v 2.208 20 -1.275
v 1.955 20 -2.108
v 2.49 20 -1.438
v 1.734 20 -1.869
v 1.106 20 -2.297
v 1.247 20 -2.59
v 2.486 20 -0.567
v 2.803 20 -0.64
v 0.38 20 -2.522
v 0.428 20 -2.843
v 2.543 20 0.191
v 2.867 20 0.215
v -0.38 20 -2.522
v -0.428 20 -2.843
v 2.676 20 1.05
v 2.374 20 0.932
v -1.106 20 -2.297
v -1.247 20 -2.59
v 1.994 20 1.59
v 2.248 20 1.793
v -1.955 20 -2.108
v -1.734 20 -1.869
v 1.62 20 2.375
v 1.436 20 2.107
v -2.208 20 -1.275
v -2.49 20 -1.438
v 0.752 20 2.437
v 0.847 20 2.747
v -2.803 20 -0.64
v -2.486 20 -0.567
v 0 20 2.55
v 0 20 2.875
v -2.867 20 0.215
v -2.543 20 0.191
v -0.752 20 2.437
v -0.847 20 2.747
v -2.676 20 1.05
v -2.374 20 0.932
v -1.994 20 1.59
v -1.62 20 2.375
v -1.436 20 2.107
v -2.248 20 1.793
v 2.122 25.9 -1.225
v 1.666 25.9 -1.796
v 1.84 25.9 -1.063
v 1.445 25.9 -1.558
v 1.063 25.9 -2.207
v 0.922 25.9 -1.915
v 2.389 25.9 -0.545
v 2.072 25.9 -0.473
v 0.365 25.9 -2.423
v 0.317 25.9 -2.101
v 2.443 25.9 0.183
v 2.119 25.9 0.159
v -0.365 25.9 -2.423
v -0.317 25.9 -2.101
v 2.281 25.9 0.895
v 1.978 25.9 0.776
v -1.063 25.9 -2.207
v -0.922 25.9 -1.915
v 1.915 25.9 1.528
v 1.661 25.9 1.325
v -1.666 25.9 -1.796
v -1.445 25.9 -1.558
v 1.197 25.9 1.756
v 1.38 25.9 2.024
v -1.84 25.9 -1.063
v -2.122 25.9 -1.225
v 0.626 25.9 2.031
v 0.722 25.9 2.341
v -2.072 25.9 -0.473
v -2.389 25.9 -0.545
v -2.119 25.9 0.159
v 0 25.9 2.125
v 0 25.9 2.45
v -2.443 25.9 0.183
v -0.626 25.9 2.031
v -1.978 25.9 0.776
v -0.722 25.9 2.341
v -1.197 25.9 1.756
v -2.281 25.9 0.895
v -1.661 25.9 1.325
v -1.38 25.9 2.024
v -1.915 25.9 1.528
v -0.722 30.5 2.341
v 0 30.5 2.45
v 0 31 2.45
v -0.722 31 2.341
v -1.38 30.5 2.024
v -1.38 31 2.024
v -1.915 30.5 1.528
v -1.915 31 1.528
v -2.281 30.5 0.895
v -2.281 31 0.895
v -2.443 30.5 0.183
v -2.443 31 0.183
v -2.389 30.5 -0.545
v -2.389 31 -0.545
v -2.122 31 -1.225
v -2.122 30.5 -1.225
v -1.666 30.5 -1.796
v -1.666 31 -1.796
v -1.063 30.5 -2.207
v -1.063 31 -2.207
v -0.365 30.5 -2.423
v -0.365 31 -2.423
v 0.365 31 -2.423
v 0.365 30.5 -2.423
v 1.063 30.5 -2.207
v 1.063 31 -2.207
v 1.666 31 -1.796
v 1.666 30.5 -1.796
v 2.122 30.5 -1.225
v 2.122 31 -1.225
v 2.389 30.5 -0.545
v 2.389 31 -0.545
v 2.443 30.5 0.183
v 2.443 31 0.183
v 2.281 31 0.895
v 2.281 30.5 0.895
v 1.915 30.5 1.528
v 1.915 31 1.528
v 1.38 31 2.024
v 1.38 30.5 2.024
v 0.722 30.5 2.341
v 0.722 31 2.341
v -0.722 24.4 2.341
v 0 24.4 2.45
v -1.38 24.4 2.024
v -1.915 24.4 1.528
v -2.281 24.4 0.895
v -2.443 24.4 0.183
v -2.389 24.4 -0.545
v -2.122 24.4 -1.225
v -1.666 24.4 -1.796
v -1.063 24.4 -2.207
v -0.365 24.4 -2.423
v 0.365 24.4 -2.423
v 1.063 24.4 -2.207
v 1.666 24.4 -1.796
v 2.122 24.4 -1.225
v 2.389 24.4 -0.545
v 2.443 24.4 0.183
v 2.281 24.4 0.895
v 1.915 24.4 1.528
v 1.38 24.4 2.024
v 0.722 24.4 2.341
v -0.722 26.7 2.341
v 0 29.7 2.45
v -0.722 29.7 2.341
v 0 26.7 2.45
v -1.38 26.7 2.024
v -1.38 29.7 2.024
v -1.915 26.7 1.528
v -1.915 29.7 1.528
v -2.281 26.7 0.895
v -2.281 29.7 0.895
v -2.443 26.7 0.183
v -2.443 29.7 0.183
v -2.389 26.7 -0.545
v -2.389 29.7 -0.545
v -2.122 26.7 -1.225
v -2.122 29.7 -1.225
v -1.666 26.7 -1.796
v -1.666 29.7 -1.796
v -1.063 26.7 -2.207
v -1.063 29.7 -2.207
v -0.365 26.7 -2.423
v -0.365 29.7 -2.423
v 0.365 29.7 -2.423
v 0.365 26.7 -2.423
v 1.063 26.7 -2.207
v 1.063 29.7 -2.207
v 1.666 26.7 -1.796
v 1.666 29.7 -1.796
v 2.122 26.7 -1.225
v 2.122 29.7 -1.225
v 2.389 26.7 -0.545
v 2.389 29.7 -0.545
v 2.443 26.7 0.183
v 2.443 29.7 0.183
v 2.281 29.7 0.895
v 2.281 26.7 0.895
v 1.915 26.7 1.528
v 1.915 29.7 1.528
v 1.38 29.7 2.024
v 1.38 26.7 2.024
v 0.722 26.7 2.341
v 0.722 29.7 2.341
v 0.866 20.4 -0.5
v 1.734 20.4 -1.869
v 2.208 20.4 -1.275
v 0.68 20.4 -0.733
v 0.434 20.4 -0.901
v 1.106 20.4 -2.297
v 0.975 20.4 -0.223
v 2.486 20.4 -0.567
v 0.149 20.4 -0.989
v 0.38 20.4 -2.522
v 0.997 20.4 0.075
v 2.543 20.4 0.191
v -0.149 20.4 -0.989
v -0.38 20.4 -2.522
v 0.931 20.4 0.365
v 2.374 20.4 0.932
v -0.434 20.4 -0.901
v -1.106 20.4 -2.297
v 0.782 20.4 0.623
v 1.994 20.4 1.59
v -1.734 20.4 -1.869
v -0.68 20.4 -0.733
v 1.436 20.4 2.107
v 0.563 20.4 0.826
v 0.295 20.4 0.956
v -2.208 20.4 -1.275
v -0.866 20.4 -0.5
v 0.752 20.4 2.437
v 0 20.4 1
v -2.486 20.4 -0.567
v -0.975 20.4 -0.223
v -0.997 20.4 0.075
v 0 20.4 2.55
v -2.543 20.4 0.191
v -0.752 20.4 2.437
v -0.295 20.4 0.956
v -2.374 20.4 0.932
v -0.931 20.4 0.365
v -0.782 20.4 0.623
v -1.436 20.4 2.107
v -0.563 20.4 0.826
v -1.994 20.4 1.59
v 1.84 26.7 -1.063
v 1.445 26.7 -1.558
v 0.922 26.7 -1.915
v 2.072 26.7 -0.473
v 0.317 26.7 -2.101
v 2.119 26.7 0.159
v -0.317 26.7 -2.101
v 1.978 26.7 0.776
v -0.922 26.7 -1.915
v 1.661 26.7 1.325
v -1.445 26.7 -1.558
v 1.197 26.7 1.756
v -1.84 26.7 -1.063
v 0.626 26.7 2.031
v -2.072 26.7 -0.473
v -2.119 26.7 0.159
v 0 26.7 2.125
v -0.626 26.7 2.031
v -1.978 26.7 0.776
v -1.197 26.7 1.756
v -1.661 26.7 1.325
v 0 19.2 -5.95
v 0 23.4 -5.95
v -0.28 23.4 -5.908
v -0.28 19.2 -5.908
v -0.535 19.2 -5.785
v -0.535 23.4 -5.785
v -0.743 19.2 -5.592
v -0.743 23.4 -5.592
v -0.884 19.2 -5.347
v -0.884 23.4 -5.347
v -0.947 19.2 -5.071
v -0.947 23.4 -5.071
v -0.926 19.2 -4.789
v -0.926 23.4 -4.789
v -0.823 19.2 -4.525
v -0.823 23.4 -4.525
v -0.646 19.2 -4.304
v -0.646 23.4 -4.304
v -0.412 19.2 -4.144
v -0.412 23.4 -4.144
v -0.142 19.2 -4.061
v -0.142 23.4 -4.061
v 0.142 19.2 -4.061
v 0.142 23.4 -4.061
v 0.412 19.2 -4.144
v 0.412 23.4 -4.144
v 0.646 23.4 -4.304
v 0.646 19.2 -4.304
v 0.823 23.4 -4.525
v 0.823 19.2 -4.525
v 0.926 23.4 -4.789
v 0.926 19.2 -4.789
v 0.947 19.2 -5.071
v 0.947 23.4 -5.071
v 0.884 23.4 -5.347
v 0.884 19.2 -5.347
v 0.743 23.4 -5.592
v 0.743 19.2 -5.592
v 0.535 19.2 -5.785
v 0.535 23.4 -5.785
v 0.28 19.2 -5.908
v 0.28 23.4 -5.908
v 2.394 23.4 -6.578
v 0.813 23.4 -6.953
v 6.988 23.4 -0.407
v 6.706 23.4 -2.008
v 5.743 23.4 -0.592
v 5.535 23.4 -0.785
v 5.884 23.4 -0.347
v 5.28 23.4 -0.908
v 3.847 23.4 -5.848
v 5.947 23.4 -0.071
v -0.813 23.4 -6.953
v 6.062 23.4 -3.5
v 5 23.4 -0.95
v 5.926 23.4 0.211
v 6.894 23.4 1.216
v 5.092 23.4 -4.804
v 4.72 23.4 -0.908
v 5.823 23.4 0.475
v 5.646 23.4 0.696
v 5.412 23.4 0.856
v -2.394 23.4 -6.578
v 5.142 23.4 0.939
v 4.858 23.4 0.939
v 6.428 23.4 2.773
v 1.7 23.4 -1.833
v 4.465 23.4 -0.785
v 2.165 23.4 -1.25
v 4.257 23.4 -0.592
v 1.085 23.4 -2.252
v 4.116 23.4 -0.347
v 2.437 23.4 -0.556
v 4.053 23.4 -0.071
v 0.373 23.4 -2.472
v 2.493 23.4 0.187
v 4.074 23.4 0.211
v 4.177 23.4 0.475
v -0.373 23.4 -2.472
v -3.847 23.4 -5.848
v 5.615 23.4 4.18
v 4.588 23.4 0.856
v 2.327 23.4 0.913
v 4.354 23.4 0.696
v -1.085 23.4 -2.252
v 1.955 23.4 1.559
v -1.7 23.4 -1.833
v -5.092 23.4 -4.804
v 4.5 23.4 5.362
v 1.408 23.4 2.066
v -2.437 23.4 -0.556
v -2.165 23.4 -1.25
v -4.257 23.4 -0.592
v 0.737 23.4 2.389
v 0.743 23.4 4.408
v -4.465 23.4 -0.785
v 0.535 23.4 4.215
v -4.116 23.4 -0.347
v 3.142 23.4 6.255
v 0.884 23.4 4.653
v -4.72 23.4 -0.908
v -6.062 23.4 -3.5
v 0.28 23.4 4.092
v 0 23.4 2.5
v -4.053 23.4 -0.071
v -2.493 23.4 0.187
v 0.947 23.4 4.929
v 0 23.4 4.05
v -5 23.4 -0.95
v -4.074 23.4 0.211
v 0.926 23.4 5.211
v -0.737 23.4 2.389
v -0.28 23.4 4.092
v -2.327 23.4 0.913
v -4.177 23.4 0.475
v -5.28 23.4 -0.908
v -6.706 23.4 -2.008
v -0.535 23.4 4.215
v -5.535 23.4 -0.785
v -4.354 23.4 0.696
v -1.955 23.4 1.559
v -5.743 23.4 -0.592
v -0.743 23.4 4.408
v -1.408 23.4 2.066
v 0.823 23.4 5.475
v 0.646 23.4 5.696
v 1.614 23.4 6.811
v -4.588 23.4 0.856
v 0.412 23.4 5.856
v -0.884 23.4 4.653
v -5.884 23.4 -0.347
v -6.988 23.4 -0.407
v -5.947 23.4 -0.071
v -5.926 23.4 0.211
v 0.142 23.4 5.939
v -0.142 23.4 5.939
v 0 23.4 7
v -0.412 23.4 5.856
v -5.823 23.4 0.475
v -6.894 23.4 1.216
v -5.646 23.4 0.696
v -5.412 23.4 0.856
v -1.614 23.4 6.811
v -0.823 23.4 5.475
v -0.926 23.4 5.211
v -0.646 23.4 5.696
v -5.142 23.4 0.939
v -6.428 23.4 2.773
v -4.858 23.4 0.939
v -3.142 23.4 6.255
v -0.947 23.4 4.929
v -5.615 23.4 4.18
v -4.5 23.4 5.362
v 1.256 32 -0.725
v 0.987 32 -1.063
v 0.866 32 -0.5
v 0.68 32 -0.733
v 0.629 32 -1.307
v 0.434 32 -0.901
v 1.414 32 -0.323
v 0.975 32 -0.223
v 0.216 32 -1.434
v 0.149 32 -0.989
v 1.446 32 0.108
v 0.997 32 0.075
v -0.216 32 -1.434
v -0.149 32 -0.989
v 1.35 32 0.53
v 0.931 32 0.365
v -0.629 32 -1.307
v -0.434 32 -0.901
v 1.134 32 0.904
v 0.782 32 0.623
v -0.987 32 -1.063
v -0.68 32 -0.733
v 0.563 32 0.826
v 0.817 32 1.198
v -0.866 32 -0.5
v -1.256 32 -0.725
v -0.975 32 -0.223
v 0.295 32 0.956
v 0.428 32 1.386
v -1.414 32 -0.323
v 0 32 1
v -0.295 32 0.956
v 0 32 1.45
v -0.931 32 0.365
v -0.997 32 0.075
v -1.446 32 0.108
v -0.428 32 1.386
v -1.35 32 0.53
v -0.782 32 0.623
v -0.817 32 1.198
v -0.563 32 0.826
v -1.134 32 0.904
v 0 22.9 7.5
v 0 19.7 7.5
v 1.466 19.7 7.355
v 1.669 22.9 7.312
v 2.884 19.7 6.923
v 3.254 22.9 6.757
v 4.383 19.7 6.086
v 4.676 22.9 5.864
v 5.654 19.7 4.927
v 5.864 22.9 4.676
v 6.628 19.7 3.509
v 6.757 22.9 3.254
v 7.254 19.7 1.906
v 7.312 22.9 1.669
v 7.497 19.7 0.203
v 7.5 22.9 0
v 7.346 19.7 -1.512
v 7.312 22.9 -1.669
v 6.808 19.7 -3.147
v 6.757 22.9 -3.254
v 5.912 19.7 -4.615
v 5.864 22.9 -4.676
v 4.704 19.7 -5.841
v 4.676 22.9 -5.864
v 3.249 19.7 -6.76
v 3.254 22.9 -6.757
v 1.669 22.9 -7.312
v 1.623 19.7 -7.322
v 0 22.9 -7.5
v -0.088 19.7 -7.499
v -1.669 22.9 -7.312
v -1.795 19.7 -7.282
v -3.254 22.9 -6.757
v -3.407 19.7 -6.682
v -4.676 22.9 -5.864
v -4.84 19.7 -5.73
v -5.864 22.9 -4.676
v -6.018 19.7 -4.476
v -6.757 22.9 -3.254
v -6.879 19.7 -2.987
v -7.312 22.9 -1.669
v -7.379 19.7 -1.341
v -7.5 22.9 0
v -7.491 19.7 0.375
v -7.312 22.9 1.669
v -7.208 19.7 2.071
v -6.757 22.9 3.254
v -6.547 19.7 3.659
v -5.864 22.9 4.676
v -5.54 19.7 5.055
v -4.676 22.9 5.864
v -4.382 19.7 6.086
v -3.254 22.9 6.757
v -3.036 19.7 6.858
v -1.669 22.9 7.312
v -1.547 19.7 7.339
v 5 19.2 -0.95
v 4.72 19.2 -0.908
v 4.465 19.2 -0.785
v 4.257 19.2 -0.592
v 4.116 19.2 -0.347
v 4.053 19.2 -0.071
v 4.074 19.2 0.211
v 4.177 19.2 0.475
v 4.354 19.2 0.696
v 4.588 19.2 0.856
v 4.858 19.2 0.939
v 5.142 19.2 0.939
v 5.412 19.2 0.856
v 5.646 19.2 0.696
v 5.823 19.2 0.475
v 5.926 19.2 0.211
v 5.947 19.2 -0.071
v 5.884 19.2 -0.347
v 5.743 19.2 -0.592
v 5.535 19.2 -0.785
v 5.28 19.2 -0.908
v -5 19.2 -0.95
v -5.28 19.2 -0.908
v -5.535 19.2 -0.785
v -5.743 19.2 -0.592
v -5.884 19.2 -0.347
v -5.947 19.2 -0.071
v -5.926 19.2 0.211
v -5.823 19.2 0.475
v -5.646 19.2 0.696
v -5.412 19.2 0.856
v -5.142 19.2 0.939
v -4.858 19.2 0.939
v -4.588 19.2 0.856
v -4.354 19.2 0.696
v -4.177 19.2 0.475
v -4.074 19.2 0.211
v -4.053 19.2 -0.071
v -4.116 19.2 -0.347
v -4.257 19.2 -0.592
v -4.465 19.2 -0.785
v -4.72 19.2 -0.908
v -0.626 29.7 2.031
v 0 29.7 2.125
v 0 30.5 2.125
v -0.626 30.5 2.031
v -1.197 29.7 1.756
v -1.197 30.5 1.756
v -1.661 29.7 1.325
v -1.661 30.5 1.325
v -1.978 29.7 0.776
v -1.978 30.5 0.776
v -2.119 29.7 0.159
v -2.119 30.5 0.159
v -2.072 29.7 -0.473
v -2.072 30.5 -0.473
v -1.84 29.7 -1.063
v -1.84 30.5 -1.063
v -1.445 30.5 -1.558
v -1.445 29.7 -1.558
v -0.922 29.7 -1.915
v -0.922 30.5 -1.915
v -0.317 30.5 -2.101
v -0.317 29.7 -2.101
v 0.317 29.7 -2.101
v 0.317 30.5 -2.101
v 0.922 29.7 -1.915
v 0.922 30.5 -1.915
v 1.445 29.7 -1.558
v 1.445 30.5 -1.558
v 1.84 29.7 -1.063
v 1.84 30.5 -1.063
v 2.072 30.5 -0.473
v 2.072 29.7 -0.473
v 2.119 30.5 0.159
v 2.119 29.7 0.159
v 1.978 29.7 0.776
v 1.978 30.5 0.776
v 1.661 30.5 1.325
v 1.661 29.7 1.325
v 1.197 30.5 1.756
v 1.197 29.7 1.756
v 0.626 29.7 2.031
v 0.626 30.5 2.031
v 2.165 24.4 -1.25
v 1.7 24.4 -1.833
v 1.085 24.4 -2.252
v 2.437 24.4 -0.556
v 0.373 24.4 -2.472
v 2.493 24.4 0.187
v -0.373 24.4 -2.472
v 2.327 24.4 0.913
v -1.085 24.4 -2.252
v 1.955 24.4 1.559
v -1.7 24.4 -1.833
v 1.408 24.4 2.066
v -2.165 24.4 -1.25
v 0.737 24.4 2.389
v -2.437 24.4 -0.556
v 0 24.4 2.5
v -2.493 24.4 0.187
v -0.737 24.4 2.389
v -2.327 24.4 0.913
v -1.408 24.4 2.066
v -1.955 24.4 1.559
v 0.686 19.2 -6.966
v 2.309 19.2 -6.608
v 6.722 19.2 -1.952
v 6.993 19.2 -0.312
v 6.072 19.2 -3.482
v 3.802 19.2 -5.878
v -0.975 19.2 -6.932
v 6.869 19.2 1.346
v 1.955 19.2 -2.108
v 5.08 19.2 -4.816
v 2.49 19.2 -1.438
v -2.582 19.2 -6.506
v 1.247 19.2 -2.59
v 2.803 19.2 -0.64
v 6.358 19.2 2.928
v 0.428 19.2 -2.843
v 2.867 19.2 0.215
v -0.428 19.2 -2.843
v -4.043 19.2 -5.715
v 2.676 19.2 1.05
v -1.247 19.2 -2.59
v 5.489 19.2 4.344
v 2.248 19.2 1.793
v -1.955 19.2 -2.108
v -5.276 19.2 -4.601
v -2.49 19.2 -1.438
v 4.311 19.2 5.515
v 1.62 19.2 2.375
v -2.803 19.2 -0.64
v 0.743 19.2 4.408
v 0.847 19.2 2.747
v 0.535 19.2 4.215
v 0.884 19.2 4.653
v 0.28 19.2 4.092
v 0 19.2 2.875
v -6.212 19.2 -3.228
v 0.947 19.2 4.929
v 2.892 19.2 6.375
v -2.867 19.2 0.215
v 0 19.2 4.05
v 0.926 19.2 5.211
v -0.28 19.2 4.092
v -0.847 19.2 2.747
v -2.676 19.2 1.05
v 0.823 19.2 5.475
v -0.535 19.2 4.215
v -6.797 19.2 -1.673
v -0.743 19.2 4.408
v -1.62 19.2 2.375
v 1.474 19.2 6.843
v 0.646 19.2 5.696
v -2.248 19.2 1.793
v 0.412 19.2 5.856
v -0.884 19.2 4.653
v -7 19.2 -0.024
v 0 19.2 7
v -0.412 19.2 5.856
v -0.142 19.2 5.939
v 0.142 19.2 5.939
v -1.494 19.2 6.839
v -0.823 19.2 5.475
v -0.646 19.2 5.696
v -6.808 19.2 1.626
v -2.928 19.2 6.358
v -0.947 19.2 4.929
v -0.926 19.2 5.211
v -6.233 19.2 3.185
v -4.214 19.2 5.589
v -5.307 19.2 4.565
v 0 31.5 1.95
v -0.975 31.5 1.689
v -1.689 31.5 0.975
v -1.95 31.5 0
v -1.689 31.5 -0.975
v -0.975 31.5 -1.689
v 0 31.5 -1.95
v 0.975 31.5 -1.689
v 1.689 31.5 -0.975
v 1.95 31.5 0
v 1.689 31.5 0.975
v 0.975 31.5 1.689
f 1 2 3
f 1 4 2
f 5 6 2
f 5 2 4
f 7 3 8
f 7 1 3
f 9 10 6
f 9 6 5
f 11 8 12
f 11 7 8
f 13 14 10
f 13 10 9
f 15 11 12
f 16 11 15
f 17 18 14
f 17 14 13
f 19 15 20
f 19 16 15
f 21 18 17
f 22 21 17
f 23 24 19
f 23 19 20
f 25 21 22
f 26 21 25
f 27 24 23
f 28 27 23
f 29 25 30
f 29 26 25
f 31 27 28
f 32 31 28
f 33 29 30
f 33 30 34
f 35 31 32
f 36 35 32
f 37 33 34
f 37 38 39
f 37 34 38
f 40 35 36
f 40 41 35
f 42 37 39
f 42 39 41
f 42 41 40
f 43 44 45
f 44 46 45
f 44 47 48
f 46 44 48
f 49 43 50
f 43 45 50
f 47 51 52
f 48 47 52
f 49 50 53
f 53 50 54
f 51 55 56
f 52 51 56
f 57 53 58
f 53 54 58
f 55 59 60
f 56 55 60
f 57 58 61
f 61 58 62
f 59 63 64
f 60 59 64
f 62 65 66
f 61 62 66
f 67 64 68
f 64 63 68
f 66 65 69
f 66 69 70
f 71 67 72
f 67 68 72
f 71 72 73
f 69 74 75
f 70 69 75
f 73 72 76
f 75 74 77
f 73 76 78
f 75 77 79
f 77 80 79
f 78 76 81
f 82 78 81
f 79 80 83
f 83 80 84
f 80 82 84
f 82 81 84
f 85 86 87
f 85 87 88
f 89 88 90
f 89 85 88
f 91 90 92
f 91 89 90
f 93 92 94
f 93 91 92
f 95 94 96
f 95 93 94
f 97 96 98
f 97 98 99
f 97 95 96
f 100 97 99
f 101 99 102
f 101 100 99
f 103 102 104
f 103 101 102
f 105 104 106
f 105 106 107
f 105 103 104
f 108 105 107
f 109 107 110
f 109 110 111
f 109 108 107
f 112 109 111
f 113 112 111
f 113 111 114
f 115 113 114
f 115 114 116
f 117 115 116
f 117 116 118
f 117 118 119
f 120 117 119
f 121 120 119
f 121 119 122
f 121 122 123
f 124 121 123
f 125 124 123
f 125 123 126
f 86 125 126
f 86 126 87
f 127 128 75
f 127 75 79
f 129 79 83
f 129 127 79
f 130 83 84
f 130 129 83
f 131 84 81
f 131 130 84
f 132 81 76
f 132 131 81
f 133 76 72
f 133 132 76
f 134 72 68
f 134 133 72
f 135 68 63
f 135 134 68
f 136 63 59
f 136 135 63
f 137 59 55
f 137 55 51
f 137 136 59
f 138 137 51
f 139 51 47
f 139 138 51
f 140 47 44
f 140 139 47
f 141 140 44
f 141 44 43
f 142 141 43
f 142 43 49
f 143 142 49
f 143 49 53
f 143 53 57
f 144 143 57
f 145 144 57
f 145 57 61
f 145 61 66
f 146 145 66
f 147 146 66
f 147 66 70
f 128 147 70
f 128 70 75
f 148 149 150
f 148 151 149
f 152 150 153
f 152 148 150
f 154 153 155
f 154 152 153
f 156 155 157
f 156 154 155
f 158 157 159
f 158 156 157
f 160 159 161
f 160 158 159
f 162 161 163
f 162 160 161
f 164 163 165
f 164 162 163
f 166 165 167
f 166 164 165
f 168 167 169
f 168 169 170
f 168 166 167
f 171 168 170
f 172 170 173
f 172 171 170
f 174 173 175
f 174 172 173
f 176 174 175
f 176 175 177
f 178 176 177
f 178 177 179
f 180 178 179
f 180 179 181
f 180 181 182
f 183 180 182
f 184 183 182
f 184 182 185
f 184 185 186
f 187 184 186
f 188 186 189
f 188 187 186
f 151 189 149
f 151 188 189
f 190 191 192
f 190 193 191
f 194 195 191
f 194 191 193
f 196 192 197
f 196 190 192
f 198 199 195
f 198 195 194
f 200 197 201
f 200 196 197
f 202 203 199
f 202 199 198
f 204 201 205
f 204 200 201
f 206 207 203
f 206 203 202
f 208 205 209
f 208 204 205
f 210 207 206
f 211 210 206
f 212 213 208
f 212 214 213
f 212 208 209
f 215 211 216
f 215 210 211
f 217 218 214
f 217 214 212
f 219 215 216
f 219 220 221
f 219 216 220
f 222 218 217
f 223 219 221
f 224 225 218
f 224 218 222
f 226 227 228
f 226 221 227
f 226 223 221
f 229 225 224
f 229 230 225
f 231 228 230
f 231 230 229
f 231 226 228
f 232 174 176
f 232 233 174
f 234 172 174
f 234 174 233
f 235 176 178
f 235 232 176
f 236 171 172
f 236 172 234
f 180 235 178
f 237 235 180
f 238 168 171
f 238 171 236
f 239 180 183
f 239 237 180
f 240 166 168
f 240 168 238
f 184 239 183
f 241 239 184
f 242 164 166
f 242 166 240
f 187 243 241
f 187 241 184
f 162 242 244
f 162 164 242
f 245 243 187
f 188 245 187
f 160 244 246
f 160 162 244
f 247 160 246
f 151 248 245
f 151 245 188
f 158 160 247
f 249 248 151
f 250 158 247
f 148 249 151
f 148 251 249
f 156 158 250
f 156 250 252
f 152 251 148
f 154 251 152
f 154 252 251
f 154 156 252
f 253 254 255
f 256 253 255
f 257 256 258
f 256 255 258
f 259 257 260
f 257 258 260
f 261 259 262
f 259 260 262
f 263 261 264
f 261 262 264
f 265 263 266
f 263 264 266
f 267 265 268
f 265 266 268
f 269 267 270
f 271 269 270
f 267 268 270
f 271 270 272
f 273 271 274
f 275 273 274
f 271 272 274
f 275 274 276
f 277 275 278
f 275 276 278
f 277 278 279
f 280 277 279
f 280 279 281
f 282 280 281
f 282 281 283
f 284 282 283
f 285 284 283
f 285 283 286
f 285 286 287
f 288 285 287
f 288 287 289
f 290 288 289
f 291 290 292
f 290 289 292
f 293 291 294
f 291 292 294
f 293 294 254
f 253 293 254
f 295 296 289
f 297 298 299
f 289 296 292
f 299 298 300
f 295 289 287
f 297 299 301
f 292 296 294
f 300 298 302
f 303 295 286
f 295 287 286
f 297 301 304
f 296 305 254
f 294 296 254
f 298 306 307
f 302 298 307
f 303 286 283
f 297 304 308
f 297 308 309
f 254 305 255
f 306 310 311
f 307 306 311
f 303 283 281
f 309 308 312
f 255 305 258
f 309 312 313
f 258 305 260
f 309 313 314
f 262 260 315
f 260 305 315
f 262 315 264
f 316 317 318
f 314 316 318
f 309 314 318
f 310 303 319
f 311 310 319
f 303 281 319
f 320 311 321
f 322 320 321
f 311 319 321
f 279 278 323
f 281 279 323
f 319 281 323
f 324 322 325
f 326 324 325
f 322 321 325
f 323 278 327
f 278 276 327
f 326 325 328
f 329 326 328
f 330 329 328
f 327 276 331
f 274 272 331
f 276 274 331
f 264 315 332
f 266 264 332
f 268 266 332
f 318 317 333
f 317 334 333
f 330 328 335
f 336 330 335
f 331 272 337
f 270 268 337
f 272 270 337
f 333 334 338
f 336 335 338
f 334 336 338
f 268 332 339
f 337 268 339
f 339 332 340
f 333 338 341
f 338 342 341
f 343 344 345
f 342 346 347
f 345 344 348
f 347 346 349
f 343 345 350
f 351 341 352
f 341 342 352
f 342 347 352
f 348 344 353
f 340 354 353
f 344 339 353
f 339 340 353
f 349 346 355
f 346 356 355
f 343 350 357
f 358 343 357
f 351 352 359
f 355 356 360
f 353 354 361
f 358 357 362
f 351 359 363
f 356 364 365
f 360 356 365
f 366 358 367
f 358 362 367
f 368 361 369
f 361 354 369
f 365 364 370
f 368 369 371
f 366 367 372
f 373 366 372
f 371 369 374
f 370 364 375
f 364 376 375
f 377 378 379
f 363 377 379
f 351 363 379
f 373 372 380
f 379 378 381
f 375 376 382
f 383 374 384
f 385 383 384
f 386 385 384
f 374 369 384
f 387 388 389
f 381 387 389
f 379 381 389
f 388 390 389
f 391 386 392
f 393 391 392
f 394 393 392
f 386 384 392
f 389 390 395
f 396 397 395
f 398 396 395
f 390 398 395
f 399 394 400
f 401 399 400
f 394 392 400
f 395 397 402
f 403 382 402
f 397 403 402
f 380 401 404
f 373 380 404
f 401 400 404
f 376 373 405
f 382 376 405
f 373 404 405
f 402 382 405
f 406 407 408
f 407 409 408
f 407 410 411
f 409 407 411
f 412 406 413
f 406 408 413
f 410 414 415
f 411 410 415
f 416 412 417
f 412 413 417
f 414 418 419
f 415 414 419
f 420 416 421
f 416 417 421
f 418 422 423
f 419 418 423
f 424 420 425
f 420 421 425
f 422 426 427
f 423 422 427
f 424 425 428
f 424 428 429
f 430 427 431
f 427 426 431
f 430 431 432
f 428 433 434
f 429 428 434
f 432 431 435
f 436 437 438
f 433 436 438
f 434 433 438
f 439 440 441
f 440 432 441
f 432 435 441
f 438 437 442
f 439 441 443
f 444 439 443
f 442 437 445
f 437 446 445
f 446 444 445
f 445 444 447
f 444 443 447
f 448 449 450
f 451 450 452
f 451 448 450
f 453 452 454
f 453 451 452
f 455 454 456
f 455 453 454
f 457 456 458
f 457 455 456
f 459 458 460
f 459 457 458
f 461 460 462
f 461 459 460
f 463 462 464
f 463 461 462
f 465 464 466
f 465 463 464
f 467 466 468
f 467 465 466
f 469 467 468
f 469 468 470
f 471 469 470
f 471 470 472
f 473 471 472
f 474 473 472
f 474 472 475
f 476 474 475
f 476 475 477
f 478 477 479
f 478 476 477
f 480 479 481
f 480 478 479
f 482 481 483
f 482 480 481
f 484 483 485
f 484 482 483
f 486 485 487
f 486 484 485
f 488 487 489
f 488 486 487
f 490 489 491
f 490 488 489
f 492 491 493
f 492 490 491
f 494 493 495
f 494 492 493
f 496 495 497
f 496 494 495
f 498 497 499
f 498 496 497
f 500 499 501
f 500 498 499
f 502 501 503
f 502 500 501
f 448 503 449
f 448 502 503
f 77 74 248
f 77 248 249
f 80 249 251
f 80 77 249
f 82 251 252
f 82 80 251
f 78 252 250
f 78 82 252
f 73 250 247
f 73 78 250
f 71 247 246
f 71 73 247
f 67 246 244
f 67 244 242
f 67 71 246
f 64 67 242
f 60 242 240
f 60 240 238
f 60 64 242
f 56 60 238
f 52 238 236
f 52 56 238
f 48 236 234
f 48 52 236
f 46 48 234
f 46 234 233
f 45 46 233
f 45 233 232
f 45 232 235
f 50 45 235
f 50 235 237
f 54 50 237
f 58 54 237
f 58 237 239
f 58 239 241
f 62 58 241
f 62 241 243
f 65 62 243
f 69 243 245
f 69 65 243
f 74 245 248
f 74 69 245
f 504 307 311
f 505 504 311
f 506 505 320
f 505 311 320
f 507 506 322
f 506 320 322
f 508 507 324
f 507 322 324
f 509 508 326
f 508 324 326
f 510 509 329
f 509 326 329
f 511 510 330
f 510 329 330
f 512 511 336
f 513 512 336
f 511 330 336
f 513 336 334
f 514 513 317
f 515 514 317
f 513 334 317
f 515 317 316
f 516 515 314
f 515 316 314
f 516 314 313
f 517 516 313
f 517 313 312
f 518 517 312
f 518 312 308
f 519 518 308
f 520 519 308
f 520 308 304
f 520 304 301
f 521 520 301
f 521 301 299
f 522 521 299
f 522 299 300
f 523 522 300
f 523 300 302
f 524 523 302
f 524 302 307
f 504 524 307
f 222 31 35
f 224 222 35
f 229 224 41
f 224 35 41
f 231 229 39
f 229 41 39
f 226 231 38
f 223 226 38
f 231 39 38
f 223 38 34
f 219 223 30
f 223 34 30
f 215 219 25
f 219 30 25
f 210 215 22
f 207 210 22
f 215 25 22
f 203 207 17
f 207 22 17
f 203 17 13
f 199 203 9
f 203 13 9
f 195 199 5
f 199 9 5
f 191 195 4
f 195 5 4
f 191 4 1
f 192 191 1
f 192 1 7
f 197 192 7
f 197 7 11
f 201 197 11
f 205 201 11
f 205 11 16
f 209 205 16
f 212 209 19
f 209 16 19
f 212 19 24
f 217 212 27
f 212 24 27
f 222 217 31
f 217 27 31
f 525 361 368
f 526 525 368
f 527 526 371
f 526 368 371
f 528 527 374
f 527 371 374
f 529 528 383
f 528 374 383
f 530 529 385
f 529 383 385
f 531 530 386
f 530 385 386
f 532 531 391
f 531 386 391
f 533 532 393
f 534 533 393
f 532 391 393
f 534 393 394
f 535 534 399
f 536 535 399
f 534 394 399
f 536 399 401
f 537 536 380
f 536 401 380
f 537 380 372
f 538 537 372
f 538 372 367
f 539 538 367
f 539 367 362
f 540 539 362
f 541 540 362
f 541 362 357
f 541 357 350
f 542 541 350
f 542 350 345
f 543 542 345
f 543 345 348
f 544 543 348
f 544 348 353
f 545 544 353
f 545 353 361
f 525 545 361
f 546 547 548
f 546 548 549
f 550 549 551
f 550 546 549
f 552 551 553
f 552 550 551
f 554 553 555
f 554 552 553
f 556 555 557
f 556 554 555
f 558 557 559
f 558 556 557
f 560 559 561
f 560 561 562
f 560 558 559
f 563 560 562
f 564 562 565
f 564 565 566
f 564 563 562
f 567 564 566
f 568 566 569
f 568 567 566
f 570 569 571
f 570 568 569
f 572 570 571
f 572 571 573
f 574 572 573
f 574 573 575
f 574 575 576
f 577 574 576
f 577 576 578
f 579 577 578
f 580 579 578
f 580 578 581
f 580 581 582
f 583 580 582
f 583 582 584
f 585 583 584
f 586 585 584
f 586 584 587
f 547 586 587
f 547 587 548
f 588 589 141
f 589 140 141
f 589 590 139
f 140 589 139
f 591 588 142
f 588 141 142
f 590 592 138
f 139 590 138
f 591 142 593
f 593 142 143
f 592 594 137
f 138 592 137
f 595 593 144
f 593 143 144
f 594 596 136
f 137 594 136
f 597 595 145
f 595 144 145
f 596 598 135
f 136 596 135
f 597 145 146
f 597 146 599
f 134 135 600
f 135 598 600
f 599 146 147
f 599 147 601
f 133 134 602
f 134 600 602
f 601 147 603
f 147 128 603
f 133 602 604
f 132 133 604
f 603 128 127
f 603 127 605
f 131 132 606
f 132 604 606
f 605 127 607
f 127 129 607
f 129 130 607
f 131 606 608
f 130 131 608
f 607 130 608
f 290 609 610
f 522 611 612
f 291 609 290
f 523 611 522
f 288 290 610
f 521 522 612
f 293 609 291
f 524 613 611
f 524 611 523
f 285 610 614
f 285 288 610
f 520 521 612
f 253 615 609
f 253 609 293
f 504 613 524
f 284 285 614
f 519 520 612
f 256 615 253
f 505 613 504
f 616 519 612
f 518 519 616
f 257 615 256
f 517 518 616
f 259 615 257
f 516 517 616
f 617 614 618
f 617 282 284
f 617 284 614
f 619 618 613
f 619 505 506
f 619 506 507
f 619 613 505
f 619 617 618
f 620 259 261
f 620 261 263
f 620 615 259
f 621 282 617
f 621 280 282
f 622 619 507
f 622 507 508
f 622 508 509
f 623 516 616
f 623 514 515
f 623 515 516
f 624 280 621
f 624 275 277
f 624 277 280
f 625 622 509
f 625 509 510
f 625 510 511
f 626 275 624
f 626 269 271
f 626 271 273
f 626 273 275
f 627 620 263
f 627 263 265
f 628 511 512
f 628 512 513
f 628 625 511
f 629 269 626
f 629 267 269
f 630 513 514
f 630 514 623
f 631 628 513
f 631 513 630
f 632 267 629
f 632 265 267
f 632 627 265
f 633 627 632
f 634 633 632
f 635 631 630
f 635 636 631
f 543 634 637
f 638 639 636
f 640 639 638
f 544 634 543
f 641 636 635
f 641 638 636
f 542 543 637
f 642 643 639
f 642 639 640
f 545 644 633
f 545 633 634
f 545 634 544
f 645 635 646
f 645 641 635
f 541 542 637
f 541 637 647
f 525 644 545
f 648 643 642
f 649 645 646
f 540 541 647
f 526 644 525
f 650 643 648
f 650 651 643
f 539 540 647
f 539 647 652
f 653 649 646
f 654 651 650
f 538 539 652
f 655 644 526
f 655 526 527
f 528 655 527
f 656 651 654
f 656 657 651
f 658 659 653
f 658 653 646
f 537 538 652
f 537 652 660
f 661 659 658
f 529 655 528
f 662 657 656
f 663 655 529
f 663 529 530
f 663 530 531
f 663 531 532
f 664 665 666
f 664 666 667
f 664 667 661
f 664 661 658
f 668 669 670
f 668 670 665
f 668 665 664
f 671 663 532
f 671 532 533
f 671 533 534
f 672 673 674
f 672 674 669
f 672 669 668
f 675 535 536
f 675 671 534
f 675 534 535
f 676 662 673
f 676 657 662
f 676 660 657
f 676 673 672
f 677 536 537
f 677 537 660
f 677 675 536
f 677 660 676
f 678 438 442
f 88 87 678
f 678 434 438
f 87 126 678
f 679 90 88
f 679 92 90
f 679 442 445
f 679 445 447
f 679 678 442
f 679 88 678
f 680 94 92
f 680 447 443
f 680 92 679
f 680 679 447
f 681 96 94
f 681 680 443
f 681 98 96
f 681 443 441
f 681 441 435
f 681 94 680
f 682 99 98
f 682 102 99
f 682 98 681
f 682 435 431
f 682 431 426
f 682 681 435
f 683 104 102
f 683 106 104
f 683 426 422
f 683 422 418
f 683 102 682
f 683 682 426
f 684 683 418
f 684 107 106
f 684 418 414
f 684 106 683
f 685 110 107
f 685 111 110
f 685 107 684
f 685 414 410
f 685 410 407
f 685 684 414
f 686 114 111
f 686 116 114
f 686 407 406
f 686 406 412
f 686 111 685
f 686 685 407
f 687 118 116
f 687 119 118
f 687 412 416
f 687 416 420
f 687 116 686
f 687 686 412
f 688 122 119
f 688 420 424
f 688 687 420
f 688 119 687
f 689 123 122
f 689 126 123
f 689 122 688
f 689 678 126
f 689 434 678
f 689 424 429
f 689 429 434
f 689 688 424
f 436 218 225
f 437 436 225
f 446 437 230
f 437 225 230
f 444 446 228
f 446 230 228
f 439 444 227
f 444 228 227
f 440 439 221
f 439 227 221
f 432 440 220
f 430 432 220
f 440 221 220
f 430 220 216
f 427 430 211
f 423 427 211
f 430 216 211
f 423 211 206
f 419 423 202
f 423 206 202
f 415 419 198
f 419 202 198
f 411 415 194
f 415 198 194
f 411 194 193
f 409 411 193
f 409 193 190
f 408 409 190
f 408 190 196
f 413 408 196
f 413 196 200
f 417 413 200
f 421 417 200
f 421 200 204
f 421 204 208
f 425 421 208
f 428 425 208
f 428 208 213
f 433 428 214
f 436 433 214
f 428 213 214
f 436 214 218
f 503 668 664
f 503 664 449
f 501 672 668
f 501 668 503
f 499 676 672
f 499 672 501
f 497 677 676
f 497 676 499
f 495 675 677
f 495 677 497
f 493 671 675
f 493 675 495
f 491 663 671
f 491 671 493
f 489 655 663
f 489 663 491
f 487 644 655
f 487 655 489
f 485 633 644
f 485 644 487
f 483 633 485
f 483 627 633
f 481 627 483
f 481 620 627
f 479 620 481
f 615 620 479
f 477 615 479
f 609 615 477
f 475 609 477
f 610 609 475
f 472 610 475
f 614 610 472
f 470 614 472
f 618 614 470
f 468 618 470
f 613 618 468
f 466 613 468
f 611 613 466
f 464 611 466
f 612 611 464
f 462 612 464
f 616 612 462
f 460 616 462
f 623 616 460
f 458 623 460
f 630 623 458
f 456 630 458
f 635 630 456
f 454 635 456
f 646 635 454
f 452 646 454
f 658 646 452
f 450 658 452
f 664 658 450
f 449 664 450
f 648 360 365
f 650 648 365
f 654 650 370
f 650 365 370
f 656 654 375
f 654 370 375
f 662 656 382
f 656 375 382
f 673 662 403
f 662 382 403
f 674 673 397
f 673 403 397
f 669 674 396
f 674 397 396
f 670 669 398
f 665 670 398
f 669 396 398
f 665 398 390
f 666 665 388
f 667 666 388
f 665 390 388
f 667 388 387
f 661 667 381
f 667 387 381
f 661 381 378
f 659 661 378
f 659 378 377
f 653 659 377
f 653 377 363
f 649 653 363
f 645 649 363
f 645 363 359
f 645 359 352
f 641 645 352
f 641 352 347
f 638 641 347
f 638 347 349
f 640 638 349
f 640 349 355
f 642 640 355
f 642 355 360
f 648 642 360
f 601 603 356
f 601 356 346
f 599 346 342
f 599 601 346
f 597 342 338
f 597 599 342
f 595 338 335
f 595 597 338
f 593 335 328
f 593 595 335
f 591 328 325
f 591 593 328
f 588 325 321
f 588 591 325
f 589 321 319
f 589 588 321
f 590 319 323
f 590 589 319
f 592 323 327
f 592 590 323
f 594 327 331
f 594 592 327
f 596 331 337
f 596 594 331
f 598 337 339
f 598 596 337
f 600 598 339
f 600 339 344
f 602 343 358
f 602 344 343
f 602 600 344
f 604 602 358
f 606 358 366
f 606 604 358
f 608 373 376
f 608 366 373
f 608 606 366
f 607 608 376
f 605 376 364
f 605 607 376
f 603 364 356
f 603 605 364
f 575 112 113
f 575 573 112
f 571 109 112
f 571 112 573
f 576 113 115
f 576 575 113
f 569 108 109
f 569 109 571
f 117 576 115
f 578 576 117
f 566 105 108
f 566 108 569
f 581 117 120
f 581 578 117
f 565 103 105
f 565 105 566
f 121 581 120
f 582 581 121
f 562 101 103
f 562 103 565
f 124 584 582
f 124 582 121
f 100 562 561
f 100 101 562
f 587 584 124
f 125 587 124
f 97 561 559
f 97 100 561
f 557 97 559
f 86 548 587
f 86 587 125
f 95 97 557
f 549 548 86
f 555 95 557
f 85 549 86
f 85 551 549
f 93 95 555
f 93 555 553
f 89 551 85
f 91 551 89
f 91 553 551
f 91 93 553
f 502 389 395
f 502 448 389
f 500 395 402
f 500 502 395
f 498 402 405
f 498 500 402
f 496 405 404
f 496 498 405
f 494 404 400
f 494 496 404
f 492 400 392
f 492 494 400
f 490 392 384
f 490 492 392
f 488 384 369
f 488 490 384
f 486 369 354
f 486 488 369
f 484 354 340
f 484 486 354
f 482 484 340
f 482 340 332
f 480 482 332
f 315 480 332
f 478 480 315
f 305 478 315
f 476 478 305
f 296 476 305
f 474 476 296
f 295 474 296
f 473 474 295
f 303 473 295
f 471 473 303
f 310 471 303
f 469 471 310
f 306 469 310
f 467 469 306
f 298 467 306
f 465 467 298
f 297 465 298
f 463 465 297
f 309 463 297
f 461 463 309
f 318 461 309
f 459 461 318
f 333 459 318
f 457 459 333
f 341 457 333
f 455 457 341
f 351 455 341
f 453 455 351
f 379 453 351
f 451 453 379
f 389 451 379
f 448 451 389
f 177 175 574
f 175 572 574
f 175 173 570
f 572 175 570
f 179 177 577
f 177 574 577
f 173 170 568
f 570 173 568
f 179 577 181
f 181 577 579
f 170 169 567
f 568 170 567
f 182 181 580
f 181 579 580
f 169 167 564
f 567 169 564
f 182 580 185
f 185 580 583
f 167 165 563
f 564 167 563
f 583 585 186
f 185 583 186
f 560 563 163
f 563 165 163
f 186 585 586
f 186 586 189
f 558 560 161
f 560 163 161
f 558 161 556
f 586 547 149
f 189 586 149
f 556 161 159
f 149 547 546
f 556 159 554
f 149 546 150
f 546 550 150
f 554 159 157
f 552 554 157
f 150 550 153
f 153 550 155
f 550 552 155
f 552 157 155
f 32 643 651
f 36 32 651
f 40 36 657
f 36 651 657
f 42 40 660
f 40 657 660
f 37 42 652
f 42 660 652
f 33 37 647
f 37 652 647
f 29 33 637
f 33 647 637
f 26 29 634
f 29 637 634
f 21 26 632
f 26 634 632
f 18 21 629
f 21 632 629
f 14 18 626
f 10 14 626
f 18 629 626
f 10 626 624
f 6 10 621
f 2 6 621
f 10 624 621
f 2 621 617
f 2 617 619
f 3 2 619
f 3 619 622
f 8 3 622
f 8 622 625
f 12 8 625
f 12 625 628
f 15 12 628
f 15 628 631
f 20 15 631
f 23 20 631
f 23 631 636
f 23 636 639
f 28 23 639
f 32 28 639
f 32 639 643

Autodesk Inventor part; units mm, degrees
ref_plane "YZ Plane" through (0, 0, 0) normal (1, 0, 0) x (0, 1, 0)
sketch "Sketch1" plane through (0, 0, 0) normal (1, 0, 0) x (0, 1, 0)
  line L0 (31, 0) -> (20.4, 0)
  line L1 (31, 0) -> (32, 0)
  line L2 (32, 0) -> (32, 2.45)
  line L3 (32, 2.45) -> (30.5, 2.45)
  line L4 (30.5, 2.45) -> (30.5, 2.125)
  line L5 (30.5, 2.125) -> (29.7, 2.125)
  line L6 (29.7, 2.125) -> (29.7, 2.45)
  line L7 (29.7, 2.45) -> (26.7, 2.45)
  line L8 (26.7, 2.45) -> (26.7, 2.125)
  line L9 (26.7, 2.125) -> (25.9, 2.125)
  line L10 (25.9, 2.125) -> (25.9, 2.45)
  line L11 (25.9, 2.45) -> (24.4, 2.45)
  line L12 (23.4, 2.5) -> (24.4, 2.5)
  line L13 (24.4, 2.5) -> (24.4, 2.45)
  line L14 (23.4, 2.5) -> (23.4, 7.5)
  line L15 (32, 2.45) -> (31, 2.45)
  line L16 (32, 2.45) -> (32, 1.45)
  line L17 (19.6, 7.5) -> (23.4, 7.5)
  line L18 (20.4, 2.55) -> (20, 2.55)
  line L19 (19.2, 7.5) -> (19.6, 7.5)
  line L20 (20.4, 2.55) -> (20.4, 0)
  line L21 (20, 2.55) -> (20, 2.875)
  line L22 (20, 2.875) -> (19.2, 2.875)
  line L23 (19.2, 2.875) -> (19.2, 7.5)
  point P0 (0, 0)
  dimension "d344" = 1
  dimension "d345" = 1.5
  dimension "d346" = 0.325
  dimension "d347" = 0.8
  dimension "d348" = 3
  dimension "d349" = 0.325
  dimension "d350" = 0.8
  dimension "d351" = 2.45
  dimension "d353" = 1
  dimension "d354" = 1
  dimension "d355" = 1
  dimension "d377" = 0.4
  dimension "d379" = 2.55
  dimension "d380" = 0.8
revolve "Revolution1" add sketch "Sketch1" angle 360 about axis through (0, 31, 0) along (0, -1, 0)
chamfer "Chamfer6" distance 0.5 angle 45 2 edges at (0, 23.4, -7.5) (0, 19.2, -7.5)
chamfer "Chamfer8" distance 1 angle 45 1 edges at (0, 32, -2.45)
sketch "Sketch13" plane through (0, 32, 0) normal (0, 1, 0) x (1, 0, 0)
  circle A0 centre (0, 0) radius 1
  point P0 (0, 0)
  dimension "d359" = 2
hole "Hole10" at (0, 32, 0) direction (0, -1, 0) diameter 2 end through all
ref_plane "Work Plane8" through (0, 26.3, 0) normal (0, 1, 0) x (1, 0, 0)
ref_plane "Work Plane9" through (0, 30.1, 0) normal (0, 1, 0) x (1, 0, 0)
sketch "Sketch15" plane through (0, 19.2, 0) normal (0, -1, 0) x (1, 0, 0)
  line L0 (0, 0) -> (5, 0)
  line L1 (0, 0) -> (-5, 0)
  line L2 (0, 0) -> (0, -5)
  line L3 (0, 0) -> (0, 5)
  dimension "d381" = 5
  dimension "d382" = 5
  dimension "d383" = 5
  dimension "d384" = 5
hole "Hole11" at (0, 19.2, -5) at (-5, 19.2, 0) at (5, 19.2, 0) at (0, 19.2, 5) direction (0, 1, 0) diameter 1.9 end through all
thread "Thread21" size "M2x0.4" class "6H" standard "ANSI Metric M Profile" full length
thread "Thread22" size "M2x0.4" class "6H" standard "ANSI Metric M Profile" full length
thread "Thread23" size "M2x0.4" class "6H" standard "ANSI Metric M Profile" full length
thread "Thread24" size "M2x0.4" class "6H" standard "ANSI Metric M Profile" full length
properties part number "None_Magnet_Extender_Split_Top" material "Aluminum 6061"
